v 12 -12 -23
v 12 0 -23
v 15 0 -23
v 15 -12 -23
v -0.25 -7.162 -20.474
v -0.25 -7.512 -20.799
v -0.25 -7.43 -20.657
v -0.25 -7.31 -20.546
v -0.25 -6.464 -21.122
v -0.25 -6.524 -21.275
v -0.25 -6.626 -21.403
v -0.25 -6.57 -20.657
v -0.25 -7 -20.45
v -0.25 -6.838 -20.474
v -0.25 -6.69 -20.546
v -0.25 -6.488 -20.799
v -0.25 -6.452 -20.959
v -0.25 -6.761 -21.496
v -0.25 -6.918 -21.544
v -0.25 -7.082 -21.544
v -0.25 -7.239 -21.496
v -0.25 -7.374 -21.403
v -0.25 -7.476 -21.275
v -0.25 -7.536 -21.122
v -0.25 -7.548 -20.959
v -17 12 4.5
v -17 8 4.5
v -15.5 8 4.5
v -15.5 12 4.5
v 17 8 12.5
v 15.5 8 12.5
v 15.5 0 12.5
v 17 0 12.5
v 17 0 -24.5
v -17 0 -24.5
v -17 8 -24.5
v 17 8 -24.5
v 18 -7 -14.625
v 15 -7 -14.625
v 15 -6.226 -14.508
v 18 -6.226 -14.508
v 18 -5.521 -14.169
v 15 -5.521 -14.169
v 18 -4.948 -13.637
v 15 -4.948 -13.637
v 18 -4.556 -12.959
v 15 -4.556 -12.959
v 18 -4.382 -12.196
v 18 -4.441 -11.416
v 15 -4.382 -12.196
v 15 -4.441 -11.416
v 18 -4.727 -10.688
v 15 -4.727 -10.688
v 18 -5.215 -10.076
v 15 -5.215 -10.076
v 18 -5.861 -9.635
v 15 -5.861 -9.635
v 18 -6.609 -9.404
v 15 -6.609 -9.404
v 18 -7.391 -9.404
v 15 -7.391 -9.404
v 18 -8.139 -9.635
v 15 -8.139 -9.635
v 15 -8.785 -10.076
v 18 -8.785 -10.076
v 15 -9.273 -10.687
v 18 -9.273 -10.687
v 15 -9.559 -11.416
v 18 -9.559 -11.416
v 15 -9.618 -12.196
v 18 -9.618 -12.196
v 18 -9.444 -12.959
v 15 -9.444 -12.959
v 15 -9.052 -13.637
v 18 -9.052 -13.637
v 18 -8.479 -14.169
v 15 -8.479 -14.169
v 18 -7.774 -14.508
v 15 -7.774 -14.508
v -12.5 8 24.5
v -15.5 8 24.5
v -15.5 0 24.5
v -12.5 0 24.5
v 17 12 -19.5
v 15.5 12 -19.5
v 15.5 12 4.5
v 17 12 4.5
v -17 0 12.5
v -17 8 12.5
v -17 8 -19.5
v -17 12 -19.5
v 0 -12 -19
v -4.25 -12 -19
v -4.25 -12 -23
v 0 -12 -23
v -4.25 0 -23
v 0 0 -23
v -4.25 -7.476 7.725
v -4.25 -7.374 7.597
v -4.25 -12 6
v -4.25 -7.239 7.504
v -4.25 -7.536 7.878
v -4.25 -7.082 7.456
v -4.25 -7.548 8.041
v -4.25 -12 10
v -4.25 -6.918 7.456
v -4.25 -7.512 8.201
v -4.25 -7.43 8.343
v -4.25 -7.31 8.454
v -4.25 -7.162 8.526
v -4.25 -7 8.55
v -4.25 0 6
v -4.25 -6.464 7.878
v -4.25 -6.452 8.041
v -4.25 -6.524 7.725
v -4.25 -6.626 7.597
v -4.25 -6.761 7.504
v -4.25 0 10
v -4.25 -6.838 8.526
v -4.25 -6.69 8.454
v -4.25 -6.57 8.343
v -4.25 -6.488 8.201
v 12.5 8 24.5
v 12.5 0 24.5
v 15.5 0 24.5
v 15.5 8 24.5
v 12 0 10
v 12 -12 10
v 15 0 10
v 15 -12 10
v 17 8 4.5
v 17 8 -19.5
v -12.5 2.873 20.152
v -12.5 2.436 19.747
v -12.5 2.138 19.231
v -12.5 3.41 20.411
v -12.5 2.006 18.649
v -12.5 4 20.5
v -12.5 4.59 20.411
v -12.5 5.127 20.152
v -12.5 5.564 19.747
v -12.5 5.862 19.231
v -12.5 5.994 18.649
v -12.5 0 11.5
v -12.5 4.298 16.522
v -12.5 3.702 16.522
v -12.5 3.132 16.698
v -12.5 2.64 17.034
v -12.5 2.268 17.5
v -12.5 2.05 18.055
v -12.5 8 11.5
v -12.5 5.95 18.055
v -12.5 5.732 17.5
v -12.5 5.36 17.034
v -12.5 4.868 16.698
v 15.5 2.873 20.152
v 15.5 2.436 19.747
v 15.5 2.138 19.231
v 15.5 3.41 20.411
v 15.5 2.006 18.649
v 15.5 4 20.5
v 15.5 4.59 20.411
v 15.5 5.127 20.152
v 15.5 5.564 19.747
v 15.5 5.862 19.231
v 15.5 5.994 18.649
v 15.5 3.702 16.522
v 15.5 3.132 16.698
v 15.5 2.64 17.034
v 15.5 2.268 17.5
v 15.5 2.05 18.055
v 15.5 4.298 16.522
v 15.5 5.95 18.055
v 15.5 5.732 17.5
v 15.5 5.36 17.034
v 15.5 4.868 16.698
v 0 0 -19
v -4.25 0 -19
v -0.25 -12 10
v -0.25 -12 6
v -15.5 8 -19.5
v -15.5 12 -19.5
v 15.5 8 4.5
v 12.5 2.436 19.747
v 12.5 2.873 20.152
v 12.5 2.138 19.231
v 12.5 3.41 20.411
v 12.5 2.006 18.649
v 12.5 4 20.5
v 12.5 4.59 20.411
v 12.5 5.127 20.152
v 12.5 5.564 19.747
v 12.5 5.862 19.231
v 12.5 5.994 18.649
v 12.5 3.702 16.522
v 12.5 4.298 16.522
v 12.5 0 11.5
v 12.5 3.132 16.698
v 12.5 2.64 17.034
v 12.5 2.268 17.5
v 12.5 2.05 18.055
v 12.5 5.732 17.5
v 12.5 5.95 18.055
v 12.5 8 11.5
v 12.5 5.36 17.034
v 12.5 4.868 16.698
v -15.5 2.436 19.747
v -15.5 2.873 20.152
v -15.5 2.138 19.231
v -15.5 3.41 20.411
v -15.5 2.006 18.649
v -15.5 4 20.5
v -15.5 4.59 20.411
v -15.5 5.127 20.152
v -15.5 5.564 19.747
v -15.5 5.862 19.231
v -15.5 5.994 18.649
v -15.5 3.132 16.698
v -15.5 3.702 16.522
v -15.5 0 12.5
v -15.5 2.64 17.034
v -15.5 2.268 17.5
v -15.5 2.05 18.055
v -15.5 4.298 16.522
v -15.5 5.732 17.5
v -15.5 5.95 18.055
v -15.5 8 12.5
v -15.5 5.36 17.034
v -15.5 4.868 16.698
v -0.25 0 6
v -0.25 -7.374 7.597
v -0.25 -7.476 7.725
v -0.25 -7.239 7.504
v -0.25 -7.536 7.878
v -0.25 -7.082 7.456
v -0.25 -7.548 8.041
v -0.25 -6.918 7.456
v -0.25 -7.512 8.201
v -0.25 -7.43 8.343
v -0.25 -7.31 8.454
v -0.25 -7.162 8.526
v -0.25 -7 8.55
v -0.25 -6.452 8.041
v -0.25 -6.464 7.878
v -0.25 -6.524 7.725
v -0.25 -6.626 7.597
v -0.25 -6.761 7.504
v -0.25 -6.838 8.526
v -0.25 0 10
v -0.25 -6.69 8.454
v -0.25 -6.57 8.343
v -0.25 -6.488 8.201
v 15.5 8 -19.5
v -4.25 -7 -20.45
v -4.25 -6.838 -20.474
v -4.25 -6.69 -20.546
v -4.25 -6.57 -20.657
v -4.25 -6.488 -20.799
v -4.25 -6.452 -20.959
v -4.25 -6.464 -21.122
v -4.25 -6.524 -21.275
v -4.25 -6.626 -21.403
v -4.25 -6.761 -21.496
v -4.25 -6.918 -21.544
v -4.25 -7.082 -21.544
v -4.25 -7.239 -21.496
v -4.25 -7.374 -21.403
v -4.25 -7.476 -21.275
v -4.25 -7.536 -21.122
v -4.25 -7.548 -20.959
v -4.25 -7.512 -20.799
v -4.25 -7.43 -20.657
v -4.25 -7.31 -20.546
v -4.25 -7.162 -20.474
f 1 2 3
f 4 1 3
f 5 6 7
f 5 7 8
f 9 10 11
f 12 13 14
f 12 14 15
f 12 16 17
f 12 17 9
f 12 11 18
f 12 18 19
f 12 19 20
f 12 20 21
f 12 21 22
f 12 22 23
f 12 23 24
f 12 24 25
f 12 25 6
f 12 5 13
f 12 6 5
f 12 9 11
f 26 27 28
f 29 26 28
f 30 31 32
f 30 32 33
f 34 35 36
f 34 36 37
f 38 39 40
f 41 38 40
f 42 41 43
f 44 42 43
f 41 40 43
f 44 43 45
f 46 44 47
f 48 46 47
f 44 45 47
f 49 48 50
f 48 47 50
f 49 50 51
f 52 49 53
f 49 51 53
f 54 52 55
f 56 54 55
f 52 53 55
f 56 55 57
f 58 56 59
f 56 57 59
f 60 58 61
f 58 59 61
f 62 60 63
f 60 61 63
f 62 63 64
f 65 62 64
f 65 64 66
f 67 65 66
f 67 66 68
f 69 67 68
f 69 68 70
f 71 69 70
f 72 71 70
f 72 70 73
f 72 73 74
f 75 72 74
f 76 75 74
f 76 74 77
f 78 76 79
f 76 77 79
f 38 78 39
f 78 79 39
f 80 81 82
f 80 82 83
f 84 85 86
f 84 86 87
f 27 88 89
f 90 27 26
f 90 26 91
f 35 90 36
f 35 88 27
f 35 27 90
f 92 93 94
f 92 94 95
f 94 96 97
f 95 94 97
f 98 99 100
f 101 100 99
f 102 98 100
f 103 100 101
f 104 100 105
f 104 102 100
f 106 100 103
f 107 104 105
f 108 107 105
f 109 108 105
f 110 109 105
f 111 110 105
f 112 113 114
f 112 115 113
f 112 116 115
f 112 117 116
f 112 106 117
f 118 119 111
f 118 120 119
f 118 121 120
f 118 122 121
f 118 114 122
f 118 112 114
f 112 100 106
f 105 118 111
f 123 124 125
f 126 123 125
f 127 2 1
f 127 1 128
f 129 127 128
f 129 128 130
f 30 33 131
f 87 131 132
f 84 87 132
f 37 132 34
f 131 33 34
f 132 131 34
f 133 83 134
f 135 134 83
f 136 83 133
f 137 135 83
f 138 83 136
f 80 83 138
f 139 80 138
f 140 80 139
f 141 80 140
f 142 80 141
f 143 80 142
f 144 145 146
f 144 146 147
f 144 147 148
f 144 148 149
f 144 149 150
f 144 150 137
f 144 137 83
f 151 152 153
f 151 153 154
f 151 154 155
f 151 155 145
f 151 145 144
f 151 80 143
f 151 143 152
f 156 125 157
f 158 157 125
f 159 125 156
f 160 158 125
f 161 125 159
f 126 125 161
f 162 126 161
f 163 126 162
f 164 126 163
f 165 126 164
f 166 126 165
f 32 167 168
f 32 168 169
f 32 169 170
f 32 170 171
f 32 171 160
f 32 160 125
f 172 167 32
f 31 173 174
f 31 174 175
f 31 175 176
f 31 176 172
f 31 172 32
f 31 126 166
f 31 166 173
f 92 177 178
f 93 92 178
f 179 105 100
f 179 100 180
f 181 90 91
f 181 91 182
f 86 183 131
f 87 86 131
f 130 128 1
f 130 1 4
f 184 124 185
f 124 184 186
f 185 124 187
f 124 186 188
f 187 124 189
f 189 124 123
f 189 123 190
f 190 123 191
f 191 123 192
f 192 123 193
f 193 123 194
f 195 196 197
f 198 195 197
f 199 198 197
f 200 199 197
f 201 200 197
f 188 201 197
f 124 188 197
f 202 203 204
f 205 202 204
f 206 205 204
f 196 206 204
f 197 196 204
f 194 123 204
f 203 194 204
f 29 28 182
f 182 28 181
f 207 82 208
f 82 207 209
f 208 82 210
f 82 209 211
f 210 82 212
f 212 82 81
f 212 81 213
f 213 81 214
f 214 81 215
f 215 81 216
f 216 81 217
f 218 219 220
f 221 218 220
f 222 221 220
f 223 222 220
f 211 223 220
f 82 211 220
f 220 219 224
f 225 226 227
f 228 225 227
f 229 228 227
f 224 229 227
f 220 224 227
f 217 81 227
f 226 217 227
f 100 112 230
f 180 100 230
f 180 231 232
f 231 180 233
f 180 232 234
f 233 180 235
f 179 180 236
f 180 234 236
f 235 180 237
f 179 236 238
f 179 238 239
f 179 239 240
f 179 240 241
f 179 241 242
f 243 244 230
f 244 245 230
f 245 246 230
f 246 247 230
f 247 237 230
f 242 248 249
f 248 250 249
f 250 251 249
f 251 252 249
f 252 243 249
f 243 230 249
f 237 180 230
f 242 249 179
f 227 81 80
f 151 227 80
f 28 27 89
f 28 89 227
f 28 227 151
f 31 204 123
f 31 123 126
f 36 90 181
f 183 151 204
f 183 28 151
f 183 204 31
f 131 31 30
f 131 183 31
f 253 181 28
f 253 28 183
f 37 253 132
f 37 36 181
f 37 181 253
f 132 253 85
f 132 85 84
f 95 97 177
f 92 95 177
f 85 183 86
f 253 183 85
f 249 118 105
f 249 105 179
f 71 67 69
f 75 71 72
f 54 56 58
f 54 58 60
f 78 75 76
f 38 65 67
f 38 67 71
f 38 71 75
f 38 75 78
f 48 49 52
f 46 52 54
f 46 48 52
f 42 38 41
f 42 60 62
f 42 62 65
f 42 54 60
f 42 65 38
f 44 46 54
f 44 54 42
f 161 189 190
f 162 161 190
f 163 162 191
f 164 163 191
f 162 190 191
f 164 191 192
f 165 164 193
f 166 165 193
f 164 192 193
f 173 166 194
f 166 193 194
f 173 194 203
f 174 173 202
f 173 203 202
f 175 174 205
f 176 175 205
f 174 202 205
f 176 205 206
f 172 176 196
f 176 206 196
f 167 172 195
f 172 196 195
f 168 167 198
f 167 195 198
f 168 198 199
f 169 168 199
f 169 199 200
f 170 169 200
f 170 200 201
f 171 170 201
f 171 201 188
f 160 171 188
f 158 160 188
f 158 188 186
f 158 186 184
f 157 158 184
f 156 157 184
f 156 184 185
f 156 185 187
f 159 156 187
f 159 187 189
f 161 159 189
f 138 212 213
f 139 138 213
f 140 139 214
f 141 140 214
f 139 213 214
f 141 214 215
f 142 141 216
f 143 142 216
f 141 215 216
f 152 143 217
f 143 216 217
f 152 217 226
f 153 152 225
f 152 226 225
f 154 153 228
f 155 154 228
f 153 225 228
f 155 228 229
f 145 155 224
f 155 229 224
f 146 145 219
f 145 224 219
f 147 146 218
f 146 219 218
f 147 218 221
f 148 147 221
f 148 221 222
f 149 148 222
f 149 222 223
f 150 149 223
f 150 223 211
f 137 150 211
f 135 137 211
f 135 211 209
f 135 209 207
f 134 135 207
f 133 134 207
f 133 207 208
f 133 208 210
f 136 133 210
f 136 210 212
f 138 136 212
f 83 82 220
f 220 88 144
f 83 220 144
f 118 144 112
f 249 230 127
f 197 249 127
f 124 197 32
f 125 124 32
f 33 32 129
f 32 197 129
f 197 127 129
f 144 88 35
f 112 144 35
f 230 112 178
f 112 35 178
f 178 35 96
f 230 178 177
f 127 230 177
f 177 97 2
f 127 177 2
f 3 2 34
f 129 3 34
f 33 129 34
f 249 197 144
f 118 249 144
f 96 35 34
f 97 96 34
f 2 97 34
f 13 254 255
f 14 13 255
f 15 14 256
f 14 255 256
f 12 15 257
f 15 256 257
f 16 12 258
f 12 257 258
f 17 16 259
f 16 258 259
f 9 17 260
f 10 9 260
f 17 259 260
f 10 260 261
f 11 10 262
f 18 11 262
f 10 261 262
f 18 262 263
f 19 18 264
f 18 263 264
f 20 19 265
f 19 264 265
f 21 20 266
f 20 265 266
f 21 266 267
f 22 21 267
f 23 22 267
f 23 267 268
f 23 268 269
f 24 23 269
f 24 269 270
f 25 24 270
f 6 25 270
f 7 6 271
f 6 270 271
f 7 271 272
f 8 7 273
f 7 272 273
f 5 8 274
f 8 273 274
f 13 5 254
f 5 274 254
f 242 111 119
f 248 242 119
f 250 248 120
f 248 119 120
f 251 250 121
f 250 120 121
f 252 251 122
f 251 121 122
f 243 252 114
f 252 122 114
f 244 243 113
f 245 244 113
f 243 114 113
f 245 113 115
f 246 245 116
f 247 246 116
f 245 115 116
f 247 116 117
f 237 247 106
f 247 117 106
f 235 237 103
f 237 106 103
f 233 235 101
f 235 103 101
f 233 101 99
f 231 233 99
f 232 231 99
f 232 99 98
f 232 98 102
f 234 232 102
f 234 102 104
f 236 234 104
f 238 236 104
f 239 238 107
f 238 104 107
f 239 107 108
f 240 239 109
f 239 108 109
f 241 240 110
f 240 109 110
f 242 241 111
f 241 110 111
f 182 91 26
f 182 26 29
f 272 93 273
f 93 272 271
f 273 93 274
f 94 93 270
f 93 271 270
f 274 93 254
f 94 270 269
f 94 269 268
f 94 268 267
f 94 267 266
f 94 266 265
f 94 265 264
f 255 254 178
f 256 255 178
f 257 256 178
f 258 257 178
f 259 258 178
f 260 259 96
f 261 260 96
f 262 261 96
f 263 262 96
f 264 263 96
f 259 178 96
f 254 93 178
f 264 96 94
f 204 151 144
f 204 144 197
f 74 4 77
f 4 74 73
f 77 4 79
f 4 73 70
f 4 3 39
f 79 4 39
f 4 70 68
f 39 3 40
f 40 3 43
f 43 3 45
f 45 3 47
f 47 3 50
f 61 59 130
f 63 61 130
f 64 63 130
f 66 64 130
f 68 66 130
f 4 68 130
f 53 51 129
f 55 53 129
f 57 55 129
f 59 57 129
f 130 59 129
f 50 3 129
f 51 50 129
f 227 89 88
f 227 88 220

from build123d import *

# Parameters (mm, degrees)
SKETCH_1_W          = 34
SKETCH_1_H          = 49
EXTRUDE_1_DEPTH     = 8
SKETCH_2_W          = 1.5
SKETCH_2_H          = 24
EXTRUDE_2_DEPTH     = 4
SKETCH_3_W          = 1.5
SKETCH_3_H          = 12
SKETCH_3_W_2        = 25
SKETCH_3_H_2        = 13
CUT_EXTRUDE_1_DEPTH = 8
CUT_EXTRUDE_2_REACH = 44.432
SKETCH_4_R          = 2
EXTRUDE_3_DEPTH     = 8
CUT_EXTRUDE_4_DEPTH = 8
SKETCH_6_W          = 4
SKETCH_6_H          = 4
SKETCH_6_W_2        = 3
SKETCH_6_H_2        = 33
EXTRUDE_5_DEPTH     = 12
SKETCH_7_R          = 2.625
EXTRUDE_6_DEPTH     = 3
SKETCH_8_R          = 0.55
CUT_EXTRUDE_5_DEPTH = 4


with BuildPart() as part:
    # 草图1 → 凸台-拉伸1 (new body)
    with BuildSketch(Plane(origin=(0, 0, 0), x_dir=(1, 0, 0), z_dir=(0, 1, 0))):
        Rectangle(SKETCH_1_W, SKETCH_1_H)
    extrude(amount=EXTRUDE_1_DEPTH)

    # 草图2 → 凸台-拉伸2 (add)
    with BuildSketch(Plane(origin=(0, 8, 0), x_dir=(1, 0, 0), z_dir=(0, 1, 0))):
        with Locations((-16.25, 7.5)):
            Rectangle(SKETCH_2_W, SKETCH_2_H)
        with Locations((16.25, 7.5)):
            Rectangle(SKETCH_2_W, SKETCH_2_H)
    extrude(amount=EXTRUDE_2_DEPTH)

    # 草图3 → 切除-拉伸1 (cut)
    with BuildSketch(Plane(origin=(0, 8, 0), x_dir=(1, 0, 0), z_dir=(0, 1, 0))):
        with Locations((-16.25, -18.5)):
            Rectangle(SKETCH_3_W, SKETCH_3_H)
        with Locations((16.25, -18.5)):
            Rectangle(SKETCH_3_W, SKETCH_3_H)
        with Locations((0, -18)):
            Rectangle(SKETCH_3_W_2, SKETCH_3_H_2)
    extrude(amount=-CUT_EXTRUDE_1_DEPTH, mode=Mode.SUBTRACT)

    # 切除-拉伸2: up to this face of the body (flat: up to its plane)
    cut_extrude_2_end = Plane(part.part.faces().sort_by_distance((15.5, 4, 18.5))[0])
    # 草图4 → 切除-拉伸2 (cut, up to the picked face)
    with BuildSketch(Plane.ZY.offset(15.5), mode=Mode.PRIVATE) as cut_extrude_2_sk1:
        with Locations((18.5, 4)):
            Circle(SKETCH_4_R)
    cut_extrude_2_tool1 = split(extrude(cut_extrude_2_sk1.sketch, amount=-CUT_EXTRUDE_2_REACH, mode=Mode.PRIVATE), bisect_by=cut_extrude_2_end, keep=Keep.BOTH, mode=Mode.PRIVATE)
    add(cut_extrude_2_tool1.solids().sort_by(Axis((-15.5, 4, 18.5), (1, 0, 0)))[0], mode=Mode.SUBTRACT)

    # 草图5 → 凸台-拉伸3 (add)
    with BuildSketch(Plane.XZ):
        Polygon((4, 11.5), (-4, 11.5), (-4, 41.5), (-13, 41.5), (-13, 56.5), (13, 56.5), (13, 41.5), (4, 41.5), align=None)
    extrude(amount=-EXTRUDE_3_DEPTH)

    # 草图5<2> → 切除-拉伸4 (cut)
    with BuildSketch(Plane.XZ):
        Polygon((4, 11.5), (-4, 11.5), (-4, 41.5), (-13, 41.5), (-13, 56.5), (13, 56.5), (13, 41.5), (4, 41.5), align=None)
    extrude(amount=-CUT_EXTRUDE_4_DEPTH, mode=Mode.SUBTRACT)

    # 草图6 → 凸台-拉伸5 (add)
    with BuildSketch(Plane.XZ):
        with Locations((-2.25, 8)):
            Rectangle(SKETCH_6_W, SKETCH_6_H)
        with Locations((13.5, -6.5)):
            Rectangle(SKETCH_6_W_2, SKETCH_6_H_2)
        Polygon((-4.25, -19), (-4.25, -19.5), (-4.25, -23), (0, -23), (0, -19.5), (0, -19), align=None)
    extrude(amount=EXTRUDE_5_DEPTH)

    # 草图7 → 凸台-拉伸6 (add)
    with BuildSketch(Plane(origin=(15, 0, 0), x_dir=(0, 0, -1), z_dir=(1, 0, 0))):
        with Locations((12, -7)):
            Circle(SKETCH_7_R)
    extrude(amount=EXTRUDE_6_DEPTH)

    # 草图8 → 切除-拉伸5 (cut)
    with BuildSketch(Plane.ZY.offset(4.25)):
        with Locations((8, -7)):
            Circle(SKETCH_8_R)
        with Locations((-21, -7)):
            Circle(SKETCH_8_R)
    extrude(amount=-CUT_EXTRUDE_5_DEPTH, mode=Mode.SUBTRACT)


solid = part.part
